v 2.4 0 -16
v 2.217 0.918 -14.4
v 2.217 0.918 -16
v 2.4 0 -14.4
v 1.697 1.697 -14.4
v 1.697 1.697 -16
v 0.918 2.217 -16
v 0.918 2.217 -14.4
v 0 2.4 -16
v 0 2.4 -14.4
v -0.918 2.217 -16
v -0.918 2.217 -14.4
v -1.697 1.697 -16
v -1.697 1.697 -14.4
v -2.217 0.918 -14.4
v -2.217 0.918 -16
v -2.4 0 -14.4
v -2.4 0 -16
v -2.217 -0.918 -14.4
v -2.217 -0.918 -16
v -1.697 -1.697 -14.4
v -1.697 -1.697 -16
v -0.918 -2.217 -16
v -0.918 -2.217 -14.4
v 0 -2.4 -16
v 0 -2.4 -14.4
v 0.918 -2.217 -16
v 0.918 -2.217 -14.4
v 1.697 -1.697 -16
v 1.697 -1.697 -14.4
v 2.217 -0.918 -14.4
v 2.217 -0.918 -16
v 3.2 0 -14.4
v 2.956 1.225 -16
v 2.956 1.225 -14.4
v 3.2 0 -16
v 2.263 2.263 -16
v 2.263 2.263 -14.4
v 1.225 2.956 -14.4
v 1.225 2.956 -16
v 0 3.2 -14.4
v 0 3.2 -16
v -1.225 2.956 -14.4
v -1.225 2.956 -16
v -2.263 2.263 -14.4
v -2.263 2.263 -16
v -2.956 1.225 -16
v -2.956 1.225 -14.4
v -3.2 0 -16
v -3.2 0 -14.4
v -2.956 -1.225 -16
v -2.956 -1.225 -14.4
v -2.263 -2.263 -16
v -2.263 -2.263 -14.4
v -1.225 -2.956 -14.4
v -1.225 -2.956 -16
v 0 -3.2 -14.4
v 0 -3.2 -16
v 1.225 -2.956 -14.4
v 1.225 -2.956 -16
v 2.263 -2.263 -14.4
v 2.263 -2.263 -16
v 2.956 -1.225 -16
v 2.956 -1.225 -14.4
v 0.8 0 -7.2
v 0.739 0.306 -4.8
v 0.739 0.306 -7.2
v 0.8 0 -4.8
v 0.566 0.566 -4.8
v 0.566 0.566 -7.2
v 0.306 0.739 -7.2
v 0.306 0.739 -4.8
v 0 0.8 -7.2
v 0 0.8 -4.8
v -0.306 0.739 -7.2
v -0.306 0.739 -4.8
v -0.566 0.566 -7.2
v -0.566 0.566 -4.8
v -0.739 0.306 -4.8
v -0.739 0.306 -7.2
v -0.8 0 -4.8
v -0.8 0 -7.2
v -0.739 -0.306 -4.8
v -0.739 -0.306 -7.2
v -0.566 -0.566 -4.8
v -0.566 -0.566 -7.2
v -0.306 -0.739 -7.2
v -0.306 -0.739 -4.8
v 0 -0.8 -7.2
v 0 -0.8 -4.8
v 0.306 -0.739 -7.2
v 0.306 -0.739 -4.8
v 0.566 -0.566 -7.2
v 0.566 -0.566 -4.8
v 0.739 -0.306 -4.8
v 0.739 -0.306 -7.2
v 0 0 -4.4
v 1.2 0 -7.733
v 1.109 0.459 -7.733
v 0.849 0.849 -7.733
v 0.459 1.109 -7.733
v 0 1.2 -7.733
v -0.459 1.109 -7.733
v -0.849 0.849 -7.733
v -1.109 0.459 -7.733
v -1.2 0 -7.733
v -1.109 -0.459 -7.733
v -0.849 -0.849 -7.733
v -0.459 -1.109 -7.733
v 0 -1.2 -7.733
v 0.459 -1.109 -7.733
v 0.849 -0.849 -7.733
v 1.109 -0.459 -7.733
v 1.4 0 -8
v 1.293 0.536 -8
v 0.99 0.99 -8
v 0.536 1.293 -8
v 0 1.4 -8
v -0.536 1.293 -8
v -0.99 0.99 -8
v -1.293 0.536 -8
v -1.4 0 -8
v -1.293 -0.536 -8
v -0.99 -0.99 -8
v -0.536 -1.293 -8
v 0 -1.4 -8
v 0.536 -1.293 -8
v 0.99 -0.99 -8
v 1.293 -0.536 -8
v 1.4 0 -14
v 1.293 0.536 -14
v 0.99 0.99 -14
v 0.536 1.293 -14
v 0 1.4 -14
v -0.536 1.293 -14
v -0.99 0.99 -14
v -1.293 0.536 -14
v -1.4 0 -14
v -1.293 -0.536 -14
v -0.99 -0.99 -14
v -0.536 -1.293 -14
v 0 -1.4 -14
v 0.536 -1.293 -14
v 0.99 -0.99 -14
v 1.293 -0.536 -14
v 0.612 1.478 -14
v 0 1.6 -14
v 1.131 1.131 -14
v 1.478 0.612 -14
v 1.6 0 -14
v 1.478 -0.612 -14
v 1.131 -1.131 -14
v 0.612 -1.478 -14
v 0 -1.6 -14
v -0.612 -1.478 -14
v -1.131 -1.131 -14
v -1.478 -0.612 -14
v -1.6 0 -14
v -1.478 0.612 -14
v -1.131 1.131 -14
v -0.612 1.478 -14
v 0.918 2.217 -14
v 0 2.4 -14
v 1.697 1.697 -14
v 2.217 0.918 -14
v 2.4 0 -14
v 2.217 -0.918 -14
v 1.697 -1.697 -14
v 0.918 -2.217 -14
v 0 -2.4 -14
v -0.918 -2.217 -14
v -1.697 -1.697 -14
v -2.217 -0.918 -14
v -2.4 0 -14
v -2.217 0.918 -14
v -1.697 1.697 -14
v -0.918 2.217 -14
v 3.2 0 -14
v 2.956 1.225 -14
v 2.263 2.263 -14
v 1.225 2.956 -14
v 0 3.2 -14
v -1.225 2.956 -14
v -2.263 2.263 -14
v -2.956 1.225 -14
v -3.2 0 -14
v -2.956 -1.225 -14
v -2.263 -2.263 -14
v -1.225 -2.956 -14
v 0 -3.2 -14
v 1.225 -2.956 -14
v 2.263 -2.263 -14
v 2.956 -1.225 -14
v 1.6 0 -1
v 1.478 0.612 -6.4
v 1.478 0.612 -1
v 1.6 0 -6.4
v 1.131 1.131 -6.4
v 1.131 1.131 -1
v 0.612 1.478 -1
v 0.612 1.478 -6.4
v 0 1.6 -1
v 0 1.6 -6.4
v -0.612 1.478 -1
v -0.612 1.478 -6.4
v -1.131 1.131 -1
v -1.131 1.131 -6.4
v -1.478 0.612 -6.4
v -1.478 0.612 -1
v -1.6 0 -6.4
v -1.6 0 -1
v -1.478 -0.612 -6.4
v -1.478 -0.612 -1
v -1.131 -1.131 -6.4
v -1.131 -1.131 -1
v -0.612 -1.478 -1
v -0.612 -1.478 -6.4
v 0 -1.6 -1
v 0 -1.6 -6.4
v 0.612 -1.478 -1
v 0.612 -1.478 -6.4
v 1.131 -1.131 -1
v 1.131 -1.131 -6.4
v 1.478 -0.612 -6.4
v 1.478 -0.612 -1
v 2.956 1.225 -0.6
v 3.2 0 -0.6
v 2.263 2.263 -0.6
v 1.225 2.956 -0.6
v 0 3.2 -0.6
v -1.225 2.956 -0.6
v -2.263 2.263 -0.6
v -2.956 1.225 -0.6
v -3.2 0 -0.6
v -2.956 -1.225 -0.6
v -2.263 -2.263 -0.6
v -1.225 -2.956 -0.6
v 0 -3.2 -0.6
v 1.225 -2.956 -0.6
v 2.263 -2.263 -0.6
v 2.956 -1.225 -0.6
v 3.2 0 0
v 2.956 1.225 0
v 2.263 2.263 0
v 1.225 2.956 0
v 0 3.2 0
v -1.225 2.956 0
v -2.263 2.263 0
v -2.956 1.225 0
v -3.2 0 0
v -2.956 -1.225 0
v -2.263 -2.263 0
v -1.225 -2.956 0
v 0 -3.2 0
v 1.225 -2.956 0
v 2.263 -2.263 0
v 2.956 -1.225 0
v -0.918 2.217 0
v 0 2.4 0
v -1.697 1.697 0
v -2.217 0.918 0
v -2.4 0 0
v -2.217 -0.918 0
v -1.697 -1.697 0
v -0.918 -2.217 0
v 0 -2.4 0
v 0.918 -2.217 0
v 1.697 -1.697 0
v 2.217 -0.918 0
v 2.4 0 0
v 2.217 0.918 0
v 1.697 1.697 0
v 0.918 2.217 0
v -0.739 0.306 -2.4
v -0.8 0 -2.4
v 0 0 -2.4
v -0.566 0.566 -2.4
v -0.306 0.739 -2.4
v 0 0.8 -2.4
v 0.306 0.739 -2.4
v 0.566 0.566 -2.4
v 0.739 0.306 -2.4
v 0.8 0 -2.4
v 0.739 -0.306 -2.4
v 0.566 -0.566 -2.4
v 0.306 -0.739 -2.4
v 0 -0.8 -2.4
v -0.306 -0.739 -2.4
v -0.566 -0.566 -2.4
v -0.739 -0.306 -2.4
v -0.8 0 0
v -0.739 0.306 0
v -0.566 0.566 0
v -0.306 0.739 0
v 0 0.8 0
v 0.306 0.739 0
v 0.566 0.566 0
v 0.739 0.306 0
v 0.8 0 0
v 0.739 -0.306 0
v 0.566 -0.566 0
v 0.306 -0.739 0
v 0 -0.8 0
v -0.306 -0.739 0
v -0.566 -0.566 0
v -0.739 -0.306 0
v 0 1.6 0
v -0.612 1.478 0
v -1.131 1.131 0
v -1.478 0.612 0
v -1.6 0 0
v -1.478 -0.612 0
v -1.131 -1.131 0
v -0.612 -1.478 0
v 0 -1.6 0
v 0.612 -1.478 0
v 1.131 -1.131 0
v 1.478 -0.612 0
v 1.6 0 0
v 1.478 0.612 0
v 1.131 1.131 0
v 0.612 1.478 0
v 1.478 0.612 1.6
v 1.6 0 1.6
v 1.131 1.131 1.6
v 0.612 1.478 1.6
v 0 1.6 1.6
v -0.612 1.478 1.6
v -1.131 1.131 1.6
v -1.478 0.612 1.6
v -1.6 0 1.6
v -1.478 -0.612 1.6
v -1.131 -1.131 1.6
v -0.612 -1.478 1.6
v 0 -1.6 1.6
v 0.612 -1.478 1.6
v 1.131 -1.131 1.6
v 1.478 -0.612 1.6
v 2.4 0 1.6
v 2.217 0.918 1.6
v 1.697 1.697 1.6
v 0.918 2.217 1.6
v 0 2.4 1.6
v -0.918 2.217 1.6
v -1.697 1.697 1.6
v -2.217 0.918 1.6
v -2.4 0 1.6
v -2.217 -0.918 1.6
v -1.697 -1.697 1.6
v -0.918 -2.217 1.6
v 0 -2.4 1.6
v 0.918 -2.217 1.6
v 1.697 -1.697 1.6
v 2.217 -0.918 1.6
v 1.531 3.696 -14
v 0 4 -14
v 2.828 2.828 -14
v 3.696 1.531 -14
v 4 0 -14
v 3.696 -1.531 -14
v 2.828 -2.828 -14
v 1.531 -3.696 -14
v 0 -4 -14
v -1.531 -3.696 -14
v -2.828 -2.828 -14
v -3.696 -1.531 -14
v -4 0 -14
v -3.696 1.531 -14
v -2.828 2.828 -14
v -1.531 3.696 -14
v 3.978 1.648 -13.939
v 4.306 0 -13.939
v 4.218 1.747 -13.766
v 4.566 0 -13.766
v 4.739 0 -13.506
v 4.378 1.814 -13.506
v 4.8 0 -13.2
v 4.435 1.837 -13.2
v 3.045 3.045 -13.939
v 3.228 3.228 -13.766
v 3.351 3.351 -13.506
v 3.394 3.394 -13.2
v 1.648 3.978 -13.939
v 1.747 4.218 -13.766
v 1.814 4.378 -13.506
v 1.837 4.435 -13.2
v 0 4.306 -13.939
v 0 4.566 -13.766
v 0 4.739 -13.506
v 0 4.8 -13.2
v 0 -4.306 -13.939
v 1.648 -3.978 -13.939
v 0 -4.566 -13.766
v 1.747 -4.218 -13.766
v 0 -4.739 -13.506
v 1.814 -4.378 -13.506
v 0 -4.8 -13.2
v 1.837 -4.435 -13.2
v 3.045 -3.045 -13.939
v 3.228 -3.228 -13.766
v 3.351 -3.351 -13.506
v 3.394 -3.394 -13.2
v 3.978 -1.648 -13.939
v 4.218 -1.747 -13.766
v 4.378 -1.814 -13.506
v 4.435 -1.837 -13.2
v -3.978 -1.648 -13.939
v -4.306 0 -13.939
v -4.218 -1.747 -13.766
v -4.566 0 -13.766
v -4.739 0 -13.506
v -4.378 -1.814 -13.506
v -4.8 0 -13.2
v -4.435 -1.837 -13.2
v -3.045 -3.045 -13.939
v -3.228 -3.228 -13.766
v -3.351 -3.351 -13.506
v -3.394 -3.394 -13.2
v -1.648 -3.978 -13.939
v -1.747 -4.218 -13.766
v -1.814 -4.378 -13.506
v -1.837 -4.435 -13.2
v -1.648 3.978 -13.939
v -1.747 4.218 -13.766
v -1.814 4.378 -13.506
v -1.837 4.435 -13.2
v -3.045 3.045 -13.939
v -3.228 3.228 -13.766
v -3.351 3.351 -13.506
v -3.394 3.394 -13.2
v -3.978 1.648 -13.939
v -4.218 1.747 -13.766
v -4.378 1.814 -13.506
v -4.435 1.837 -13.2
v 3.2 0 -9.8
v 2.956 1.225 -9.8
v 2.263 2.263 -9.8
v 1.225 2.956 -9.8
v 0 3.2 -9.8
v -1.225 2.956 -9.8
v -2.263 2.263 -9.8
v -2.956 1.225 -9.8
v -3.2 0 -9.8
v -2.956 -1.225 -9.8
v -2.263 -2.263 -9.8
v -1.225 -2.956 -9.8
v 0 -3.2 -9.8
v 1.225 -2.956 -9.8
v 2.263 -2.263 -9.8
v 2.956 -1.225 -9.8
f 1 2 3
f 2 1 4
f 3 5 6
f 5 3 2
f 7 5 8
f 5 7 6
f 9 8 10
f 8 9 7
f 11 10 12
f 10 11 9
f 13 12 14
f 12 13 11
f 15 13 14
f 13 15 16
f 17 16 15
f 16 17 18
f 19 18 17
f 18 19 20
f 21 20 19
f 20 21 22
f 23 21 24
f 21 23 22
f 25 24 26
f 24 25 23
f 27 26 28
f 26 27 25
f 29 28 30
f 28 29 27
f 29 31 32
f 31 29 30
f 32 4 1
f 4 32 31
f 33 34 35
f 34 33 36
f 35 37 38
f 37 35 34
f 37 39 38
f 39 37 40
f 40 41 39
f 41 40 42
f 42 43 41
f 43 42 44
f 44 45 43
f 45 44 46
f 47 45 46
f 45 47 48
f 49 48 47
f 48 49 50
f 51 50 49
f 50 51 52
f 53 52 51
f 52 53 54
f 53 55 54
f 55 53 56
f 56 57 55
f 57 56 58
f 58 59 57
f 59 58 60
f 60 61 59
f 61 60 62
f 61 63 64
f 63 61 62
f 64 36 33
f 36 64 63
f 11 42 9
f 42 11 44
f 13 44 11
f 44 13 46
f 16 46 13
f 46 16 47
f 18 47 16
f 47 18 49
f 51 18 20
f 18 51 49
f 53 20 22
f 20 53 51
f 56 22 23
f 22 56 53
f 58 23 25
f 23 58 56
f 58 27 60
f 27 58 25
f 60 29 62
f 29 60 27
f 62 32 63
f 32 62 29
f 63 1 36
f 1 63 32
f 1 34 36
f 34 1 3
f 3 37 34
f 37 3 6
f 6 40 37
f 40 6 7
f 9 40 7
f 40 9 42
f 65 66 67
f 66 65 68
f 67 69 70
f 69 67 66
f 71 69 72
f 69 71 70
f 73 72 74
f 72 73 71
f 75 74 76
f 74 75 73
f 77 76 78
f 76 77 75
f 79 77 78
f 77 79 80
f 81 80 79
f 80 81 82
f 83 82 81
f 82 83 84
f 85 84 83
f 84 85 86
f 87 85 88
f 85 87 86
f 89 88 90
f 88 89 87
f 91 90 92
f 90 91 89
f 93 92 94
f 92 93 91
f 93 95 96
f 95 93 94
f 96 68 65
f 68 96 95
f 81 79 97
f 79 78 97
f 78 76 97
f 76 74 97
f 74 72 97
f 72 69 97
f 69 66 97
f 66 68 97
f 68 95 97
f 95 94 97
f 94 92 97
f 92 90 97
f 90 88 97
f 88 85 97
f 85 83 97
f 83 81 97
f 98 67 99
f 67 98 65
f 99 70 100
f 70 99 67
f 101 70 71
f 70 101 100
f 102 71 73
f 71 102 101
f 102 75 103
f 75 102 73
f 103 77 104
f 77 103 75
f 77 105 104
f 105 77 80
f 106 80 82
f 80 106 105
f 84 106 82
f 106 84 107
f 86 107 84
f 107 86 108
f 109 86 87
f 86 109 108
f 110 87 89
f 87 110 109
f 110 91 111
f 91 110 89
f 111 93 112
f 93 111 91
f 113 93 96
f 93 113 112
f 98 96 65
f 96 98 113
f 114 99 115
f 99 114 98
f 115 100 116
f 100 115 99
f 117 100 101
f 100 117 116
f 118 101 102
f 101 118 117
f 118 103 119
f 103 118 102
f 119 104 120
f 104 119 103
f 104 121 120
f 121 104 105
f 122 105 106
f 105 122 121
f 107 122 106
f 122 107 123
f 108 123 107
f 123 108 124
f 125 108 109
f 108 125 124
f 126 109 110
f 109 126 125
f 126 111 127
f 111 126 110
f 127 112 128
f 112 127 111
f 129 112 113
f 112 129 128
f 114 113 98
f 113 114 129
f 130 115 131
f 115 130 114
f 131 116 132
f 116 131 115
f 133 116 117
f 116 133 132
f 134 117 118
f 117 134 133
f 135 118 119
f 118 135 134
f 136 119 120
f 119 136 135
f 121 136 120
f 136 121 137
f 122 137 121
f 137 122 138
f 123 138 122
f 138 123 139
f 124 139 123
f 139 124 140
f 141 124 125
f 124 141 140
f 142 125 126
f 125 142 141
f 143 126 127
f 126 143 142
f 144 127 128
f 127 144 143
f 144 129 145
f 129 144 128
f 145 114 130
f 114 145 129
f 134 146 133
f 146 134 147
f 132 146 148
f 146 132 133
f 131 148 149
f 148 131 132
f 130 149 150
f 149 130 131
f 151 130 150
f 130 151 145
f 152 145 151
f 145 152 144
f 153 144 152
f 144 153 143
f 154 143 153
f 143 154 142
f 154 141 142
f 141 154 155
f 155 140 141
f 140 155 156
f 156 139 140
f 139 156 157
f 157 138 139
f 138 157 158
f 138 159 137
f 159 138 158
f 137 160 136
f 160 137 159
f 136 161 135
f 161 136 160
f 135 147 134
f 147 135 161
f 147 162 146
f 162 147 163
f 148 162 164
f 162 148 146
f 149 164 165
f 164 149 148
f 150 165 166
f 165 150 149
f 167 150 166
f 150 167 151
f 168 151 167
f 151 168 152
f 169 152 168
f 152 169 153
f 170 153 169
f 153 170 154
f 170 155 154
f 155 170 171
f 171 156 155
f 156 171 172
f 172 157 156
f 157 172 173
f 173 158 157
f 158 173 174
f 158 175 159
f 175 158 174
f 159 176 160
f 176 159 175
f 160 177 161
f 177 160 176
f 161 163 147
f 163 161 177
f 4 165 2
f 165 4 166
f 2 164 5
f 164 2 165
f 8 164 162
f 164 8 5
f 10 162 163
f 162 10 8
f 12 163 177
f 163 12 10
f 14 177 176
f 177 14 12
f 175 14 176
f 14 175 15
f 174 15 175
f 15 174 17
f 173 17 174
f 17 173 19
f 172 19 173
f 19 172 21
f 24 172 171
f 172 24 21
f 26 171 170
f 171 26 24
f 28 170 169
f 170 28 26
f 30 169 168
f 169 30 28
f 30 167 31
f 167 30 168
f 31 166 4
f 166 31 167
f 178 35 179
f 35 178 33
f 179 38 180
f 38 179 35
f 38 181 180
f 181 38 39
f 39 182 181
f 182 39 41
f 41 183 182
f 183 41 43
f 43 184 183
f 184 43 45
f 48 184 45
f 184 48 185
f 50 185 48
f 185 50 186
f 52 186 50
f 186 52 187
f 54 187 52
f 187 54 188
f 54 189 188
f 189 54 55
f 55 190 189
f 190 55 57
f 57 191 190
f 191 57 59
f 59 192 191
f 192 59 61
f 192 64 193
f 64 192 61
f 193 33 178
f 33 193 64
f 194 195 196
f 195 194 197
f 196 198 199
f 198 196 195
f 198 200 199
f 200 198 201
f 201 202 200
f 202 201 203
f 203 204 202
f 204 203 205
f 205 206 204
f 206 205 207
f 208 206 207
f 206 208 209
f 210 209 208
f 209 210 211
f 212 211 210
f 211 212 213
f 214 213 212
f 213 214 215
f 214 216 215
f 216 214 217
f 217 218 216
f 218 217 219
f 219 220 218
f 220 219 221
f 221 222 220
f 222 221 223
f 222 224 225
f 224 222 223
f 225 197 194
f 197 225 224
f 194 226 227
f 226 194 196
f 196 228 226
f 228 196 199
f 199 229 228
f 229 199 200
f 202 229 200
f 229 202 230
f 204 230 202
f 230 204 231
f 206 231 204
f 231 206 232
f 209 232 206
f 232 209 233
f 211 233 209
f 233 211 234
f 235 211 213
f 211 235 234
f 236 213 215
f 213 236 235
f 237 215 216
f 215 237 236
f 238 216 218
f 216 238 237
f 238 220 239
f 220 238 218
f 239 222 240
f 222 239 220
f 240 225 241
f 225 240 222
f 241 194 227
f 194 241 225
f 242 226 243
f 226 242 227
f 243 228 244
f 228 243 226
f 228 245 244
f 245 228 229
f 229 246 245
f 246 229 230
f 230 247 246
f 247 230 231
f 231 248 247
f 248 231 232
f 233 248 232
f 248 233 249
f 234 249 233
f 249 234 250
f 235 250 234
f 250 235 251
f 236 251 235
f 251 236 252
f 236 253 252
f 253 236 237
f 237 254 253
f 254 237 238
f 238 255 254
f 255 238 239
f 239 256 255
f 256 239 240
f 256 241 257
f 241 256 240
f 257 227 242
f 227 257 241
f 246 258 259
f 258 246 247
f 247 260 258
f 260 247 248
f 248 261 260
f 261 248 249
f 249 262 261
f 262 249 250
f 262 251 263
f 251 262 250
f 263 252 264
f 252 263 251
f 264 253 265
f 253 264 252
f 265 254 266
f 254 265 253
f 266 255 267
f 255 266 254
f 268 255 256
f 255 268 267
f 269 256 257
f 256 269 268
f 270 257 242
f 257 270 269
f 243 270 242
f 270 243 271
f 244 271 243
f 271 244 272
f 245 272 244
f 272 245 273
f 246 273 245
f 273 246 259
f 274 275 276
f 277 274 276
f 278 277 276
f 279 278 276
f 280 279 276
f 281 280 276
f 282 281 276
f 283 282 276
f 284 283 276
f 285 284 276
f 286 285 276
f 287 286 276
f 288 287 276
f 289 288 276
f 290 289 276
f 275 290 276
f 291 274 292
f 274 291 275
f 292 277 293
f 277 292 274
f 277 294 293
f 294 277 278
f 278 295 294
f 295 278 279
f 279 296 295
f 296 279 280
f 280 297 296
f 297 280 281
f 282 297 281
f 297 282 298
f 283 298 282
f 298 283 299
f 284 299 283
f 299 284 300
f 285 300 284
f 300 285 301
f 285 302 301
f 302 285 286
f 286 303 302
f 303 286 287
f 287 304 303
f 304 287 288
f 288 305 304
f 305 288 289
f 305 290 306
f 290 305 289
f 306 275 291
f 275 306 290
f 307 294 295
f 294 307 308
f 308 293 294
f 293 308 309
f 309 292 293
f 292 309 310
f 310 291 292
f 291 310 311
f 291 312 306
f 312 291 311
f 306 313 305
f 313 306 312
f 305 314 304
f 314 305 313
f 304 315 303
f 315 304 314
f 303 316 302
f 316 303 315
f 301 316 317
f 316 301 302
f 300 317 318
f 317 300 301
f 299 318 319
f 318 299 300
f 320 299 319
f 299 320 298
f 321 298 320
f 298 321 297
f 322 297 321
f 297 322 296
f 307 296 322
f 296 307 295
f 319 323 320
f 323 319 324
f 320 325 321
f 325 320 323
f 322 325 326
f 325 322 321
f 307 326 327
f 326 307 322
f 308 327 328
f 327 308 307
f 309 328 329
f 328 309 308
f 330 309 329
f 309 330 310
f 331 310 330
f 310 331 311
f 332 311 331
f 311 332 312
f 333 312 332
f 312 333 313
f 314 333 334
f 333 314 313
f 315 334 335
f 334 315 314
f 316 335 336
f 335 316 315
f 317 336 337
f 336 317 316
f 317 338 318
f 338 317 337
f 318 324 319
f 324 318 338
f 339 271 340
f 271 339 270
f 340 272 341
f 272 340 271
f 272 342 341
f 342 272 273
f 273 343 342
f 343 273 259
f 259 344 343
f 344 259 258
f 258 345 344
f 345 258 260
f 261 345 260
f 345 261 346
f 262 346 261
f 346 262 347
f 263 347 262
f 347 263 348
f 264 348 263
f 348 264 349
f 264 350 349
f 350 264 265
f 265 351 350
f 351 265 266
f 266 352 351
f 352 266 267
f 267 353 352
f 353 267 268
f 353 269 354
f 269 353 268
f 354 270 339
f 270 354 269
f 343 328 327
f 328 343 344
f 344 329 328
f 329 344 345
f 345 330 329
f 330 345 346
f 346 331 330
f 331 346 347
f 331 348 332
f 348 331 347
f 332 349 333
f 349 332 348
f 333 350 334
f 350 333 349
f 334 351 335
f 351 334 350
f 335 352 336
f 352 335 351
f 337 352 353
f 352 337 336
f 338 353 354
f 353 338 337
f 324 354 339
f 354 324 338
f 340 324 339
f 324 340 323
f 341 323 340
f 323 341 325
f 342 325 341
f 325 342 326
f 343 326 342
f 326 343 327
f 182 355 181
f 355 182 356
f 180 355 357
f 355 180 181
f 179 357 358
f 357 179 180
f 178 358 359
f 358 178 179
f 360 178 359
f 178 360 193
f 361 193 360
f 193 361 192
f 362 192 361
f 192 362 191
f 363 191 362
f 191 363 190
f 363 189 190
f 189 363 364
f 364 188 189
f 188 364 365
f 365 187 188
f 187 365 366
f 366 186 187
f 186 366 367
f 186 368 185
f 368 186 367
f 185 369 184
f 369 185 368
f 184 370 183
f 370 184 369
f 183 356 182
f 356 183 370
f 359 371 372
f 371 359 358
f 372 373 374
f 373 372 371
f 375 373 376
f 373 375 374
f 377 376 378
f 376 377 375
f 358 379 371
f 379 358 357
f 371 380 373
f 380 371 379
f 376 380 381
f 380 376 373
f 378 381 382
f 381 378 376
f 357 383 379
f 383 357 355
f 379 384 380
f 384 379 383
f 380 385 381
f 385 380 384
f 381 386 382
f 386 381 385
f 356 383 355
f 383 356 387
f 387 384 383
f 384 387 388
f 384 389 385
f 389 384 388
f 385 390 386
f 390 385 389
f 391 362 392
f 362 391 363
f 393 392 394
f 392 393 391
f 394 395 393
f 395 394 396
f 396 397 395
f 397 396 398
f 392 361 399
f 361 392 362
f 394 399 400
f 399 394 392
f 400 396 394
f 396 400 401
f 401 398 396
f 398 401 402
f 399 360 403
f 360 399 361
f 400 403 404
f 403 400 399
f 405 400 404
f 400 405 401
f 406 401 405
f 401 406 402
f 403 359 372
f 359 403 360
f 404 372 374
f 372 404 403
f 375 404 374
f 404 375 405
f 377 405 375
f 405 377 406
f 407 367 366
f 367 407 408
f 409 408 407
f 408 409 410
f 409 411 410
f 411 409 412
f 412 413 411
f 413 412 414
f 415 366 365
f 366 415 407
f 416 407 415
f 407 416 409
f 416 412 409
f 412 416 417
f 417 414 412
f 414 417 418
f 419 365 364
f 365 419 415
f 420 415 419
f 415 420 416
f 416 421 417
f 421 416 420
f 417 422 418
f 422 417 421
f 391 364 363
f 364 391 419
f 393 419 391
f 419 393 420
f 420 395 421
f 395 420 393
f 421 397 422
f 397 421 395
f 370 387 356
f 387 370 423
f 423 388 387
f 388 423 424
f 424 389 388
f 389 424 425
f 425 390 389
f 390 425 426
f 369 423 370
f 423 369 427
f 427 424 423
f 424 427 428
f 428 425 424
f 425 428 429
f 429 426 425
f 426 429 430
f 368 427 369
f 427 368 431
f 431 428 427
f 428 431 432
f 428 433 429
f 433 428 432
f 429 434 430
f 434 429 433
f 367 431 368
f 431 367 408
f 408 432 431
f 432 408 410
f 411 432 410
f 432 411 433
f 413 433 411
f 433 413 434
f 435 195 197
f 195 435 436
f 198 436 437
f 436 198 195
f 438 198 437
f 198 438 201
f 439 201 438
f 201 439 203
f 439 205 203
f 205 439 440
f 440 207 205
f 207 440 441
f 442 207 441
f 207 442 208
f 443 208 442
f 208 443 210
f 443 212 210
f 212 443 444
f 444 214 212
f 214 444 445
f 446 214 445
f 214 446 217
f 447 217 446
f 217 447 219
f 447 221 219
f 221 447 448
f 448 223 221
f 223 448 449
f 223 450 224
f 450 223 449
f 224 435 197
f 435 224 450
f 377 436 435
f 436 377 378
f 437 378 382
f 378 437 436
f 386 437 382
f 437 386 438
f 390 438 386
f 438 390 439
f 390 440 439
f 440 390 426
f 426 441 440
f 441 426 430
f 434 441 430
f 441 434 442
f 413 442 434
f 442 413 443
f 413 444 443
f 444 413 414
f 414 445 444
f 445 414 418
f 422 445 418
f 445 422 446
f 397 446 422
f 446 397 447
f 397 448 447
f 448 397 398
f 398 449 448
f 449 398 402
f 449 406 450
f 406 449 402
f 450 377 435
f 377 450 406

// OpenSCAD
use <../lib.scad>
use <s/u9180s01.scad>
use <s/u9180s02.scad>
function ldraw_lib__u9180c01() = [
// 0 Minifig Conical Flask TransClear with Coloured Base
// 0 Name: u9180c01.dat
// 0 Author: Chris Dee [cwdee]
// 0 !LDRAW_ORG Part UPDATE 2012-02
// 0 !LICENSE Licensed under CC BY 2.0 and CC BY 4.0 : see CAreadme.txt
// 
// 0 BFC CERTIFY CCW
  [0,"BFC","CERTIFY"],
  [0,"BFC","CCW"],
// 
// 0 !CATEGORY Minifig Accessory
// 
// 0 !HISTORY 2012-08-09 [PTadmin] Official Update 2012-02
// 
// 
// 1 47 0 0 0 1 0 0 0 1 0 0 0 1 s\u9180s01.dat
  [1,47,0,0,0,1,0,0,0,1,0,0,0,1, ldraw_lib__s__u9180s01()],
// 1 16 0 0 0 1 0 0 0 1 0 0 0 1 s\u9180s02.dat
  [1,16,0,0,0,1,0,0,0,1,0,0,0,1, ldraw_lib__s__u9180s02()],
];
module ldraw_lib__u9180c01(step=0, col=false, unit=2/5, alt=false, line=0.2, solid=!$preview)
    makepoly(ldraw_lib__u9180c01(), step=step, col=col, unit=unit, alt=alt, line=line, solid=solid);
ldraw_lib__u9180c01(line=0.2);
